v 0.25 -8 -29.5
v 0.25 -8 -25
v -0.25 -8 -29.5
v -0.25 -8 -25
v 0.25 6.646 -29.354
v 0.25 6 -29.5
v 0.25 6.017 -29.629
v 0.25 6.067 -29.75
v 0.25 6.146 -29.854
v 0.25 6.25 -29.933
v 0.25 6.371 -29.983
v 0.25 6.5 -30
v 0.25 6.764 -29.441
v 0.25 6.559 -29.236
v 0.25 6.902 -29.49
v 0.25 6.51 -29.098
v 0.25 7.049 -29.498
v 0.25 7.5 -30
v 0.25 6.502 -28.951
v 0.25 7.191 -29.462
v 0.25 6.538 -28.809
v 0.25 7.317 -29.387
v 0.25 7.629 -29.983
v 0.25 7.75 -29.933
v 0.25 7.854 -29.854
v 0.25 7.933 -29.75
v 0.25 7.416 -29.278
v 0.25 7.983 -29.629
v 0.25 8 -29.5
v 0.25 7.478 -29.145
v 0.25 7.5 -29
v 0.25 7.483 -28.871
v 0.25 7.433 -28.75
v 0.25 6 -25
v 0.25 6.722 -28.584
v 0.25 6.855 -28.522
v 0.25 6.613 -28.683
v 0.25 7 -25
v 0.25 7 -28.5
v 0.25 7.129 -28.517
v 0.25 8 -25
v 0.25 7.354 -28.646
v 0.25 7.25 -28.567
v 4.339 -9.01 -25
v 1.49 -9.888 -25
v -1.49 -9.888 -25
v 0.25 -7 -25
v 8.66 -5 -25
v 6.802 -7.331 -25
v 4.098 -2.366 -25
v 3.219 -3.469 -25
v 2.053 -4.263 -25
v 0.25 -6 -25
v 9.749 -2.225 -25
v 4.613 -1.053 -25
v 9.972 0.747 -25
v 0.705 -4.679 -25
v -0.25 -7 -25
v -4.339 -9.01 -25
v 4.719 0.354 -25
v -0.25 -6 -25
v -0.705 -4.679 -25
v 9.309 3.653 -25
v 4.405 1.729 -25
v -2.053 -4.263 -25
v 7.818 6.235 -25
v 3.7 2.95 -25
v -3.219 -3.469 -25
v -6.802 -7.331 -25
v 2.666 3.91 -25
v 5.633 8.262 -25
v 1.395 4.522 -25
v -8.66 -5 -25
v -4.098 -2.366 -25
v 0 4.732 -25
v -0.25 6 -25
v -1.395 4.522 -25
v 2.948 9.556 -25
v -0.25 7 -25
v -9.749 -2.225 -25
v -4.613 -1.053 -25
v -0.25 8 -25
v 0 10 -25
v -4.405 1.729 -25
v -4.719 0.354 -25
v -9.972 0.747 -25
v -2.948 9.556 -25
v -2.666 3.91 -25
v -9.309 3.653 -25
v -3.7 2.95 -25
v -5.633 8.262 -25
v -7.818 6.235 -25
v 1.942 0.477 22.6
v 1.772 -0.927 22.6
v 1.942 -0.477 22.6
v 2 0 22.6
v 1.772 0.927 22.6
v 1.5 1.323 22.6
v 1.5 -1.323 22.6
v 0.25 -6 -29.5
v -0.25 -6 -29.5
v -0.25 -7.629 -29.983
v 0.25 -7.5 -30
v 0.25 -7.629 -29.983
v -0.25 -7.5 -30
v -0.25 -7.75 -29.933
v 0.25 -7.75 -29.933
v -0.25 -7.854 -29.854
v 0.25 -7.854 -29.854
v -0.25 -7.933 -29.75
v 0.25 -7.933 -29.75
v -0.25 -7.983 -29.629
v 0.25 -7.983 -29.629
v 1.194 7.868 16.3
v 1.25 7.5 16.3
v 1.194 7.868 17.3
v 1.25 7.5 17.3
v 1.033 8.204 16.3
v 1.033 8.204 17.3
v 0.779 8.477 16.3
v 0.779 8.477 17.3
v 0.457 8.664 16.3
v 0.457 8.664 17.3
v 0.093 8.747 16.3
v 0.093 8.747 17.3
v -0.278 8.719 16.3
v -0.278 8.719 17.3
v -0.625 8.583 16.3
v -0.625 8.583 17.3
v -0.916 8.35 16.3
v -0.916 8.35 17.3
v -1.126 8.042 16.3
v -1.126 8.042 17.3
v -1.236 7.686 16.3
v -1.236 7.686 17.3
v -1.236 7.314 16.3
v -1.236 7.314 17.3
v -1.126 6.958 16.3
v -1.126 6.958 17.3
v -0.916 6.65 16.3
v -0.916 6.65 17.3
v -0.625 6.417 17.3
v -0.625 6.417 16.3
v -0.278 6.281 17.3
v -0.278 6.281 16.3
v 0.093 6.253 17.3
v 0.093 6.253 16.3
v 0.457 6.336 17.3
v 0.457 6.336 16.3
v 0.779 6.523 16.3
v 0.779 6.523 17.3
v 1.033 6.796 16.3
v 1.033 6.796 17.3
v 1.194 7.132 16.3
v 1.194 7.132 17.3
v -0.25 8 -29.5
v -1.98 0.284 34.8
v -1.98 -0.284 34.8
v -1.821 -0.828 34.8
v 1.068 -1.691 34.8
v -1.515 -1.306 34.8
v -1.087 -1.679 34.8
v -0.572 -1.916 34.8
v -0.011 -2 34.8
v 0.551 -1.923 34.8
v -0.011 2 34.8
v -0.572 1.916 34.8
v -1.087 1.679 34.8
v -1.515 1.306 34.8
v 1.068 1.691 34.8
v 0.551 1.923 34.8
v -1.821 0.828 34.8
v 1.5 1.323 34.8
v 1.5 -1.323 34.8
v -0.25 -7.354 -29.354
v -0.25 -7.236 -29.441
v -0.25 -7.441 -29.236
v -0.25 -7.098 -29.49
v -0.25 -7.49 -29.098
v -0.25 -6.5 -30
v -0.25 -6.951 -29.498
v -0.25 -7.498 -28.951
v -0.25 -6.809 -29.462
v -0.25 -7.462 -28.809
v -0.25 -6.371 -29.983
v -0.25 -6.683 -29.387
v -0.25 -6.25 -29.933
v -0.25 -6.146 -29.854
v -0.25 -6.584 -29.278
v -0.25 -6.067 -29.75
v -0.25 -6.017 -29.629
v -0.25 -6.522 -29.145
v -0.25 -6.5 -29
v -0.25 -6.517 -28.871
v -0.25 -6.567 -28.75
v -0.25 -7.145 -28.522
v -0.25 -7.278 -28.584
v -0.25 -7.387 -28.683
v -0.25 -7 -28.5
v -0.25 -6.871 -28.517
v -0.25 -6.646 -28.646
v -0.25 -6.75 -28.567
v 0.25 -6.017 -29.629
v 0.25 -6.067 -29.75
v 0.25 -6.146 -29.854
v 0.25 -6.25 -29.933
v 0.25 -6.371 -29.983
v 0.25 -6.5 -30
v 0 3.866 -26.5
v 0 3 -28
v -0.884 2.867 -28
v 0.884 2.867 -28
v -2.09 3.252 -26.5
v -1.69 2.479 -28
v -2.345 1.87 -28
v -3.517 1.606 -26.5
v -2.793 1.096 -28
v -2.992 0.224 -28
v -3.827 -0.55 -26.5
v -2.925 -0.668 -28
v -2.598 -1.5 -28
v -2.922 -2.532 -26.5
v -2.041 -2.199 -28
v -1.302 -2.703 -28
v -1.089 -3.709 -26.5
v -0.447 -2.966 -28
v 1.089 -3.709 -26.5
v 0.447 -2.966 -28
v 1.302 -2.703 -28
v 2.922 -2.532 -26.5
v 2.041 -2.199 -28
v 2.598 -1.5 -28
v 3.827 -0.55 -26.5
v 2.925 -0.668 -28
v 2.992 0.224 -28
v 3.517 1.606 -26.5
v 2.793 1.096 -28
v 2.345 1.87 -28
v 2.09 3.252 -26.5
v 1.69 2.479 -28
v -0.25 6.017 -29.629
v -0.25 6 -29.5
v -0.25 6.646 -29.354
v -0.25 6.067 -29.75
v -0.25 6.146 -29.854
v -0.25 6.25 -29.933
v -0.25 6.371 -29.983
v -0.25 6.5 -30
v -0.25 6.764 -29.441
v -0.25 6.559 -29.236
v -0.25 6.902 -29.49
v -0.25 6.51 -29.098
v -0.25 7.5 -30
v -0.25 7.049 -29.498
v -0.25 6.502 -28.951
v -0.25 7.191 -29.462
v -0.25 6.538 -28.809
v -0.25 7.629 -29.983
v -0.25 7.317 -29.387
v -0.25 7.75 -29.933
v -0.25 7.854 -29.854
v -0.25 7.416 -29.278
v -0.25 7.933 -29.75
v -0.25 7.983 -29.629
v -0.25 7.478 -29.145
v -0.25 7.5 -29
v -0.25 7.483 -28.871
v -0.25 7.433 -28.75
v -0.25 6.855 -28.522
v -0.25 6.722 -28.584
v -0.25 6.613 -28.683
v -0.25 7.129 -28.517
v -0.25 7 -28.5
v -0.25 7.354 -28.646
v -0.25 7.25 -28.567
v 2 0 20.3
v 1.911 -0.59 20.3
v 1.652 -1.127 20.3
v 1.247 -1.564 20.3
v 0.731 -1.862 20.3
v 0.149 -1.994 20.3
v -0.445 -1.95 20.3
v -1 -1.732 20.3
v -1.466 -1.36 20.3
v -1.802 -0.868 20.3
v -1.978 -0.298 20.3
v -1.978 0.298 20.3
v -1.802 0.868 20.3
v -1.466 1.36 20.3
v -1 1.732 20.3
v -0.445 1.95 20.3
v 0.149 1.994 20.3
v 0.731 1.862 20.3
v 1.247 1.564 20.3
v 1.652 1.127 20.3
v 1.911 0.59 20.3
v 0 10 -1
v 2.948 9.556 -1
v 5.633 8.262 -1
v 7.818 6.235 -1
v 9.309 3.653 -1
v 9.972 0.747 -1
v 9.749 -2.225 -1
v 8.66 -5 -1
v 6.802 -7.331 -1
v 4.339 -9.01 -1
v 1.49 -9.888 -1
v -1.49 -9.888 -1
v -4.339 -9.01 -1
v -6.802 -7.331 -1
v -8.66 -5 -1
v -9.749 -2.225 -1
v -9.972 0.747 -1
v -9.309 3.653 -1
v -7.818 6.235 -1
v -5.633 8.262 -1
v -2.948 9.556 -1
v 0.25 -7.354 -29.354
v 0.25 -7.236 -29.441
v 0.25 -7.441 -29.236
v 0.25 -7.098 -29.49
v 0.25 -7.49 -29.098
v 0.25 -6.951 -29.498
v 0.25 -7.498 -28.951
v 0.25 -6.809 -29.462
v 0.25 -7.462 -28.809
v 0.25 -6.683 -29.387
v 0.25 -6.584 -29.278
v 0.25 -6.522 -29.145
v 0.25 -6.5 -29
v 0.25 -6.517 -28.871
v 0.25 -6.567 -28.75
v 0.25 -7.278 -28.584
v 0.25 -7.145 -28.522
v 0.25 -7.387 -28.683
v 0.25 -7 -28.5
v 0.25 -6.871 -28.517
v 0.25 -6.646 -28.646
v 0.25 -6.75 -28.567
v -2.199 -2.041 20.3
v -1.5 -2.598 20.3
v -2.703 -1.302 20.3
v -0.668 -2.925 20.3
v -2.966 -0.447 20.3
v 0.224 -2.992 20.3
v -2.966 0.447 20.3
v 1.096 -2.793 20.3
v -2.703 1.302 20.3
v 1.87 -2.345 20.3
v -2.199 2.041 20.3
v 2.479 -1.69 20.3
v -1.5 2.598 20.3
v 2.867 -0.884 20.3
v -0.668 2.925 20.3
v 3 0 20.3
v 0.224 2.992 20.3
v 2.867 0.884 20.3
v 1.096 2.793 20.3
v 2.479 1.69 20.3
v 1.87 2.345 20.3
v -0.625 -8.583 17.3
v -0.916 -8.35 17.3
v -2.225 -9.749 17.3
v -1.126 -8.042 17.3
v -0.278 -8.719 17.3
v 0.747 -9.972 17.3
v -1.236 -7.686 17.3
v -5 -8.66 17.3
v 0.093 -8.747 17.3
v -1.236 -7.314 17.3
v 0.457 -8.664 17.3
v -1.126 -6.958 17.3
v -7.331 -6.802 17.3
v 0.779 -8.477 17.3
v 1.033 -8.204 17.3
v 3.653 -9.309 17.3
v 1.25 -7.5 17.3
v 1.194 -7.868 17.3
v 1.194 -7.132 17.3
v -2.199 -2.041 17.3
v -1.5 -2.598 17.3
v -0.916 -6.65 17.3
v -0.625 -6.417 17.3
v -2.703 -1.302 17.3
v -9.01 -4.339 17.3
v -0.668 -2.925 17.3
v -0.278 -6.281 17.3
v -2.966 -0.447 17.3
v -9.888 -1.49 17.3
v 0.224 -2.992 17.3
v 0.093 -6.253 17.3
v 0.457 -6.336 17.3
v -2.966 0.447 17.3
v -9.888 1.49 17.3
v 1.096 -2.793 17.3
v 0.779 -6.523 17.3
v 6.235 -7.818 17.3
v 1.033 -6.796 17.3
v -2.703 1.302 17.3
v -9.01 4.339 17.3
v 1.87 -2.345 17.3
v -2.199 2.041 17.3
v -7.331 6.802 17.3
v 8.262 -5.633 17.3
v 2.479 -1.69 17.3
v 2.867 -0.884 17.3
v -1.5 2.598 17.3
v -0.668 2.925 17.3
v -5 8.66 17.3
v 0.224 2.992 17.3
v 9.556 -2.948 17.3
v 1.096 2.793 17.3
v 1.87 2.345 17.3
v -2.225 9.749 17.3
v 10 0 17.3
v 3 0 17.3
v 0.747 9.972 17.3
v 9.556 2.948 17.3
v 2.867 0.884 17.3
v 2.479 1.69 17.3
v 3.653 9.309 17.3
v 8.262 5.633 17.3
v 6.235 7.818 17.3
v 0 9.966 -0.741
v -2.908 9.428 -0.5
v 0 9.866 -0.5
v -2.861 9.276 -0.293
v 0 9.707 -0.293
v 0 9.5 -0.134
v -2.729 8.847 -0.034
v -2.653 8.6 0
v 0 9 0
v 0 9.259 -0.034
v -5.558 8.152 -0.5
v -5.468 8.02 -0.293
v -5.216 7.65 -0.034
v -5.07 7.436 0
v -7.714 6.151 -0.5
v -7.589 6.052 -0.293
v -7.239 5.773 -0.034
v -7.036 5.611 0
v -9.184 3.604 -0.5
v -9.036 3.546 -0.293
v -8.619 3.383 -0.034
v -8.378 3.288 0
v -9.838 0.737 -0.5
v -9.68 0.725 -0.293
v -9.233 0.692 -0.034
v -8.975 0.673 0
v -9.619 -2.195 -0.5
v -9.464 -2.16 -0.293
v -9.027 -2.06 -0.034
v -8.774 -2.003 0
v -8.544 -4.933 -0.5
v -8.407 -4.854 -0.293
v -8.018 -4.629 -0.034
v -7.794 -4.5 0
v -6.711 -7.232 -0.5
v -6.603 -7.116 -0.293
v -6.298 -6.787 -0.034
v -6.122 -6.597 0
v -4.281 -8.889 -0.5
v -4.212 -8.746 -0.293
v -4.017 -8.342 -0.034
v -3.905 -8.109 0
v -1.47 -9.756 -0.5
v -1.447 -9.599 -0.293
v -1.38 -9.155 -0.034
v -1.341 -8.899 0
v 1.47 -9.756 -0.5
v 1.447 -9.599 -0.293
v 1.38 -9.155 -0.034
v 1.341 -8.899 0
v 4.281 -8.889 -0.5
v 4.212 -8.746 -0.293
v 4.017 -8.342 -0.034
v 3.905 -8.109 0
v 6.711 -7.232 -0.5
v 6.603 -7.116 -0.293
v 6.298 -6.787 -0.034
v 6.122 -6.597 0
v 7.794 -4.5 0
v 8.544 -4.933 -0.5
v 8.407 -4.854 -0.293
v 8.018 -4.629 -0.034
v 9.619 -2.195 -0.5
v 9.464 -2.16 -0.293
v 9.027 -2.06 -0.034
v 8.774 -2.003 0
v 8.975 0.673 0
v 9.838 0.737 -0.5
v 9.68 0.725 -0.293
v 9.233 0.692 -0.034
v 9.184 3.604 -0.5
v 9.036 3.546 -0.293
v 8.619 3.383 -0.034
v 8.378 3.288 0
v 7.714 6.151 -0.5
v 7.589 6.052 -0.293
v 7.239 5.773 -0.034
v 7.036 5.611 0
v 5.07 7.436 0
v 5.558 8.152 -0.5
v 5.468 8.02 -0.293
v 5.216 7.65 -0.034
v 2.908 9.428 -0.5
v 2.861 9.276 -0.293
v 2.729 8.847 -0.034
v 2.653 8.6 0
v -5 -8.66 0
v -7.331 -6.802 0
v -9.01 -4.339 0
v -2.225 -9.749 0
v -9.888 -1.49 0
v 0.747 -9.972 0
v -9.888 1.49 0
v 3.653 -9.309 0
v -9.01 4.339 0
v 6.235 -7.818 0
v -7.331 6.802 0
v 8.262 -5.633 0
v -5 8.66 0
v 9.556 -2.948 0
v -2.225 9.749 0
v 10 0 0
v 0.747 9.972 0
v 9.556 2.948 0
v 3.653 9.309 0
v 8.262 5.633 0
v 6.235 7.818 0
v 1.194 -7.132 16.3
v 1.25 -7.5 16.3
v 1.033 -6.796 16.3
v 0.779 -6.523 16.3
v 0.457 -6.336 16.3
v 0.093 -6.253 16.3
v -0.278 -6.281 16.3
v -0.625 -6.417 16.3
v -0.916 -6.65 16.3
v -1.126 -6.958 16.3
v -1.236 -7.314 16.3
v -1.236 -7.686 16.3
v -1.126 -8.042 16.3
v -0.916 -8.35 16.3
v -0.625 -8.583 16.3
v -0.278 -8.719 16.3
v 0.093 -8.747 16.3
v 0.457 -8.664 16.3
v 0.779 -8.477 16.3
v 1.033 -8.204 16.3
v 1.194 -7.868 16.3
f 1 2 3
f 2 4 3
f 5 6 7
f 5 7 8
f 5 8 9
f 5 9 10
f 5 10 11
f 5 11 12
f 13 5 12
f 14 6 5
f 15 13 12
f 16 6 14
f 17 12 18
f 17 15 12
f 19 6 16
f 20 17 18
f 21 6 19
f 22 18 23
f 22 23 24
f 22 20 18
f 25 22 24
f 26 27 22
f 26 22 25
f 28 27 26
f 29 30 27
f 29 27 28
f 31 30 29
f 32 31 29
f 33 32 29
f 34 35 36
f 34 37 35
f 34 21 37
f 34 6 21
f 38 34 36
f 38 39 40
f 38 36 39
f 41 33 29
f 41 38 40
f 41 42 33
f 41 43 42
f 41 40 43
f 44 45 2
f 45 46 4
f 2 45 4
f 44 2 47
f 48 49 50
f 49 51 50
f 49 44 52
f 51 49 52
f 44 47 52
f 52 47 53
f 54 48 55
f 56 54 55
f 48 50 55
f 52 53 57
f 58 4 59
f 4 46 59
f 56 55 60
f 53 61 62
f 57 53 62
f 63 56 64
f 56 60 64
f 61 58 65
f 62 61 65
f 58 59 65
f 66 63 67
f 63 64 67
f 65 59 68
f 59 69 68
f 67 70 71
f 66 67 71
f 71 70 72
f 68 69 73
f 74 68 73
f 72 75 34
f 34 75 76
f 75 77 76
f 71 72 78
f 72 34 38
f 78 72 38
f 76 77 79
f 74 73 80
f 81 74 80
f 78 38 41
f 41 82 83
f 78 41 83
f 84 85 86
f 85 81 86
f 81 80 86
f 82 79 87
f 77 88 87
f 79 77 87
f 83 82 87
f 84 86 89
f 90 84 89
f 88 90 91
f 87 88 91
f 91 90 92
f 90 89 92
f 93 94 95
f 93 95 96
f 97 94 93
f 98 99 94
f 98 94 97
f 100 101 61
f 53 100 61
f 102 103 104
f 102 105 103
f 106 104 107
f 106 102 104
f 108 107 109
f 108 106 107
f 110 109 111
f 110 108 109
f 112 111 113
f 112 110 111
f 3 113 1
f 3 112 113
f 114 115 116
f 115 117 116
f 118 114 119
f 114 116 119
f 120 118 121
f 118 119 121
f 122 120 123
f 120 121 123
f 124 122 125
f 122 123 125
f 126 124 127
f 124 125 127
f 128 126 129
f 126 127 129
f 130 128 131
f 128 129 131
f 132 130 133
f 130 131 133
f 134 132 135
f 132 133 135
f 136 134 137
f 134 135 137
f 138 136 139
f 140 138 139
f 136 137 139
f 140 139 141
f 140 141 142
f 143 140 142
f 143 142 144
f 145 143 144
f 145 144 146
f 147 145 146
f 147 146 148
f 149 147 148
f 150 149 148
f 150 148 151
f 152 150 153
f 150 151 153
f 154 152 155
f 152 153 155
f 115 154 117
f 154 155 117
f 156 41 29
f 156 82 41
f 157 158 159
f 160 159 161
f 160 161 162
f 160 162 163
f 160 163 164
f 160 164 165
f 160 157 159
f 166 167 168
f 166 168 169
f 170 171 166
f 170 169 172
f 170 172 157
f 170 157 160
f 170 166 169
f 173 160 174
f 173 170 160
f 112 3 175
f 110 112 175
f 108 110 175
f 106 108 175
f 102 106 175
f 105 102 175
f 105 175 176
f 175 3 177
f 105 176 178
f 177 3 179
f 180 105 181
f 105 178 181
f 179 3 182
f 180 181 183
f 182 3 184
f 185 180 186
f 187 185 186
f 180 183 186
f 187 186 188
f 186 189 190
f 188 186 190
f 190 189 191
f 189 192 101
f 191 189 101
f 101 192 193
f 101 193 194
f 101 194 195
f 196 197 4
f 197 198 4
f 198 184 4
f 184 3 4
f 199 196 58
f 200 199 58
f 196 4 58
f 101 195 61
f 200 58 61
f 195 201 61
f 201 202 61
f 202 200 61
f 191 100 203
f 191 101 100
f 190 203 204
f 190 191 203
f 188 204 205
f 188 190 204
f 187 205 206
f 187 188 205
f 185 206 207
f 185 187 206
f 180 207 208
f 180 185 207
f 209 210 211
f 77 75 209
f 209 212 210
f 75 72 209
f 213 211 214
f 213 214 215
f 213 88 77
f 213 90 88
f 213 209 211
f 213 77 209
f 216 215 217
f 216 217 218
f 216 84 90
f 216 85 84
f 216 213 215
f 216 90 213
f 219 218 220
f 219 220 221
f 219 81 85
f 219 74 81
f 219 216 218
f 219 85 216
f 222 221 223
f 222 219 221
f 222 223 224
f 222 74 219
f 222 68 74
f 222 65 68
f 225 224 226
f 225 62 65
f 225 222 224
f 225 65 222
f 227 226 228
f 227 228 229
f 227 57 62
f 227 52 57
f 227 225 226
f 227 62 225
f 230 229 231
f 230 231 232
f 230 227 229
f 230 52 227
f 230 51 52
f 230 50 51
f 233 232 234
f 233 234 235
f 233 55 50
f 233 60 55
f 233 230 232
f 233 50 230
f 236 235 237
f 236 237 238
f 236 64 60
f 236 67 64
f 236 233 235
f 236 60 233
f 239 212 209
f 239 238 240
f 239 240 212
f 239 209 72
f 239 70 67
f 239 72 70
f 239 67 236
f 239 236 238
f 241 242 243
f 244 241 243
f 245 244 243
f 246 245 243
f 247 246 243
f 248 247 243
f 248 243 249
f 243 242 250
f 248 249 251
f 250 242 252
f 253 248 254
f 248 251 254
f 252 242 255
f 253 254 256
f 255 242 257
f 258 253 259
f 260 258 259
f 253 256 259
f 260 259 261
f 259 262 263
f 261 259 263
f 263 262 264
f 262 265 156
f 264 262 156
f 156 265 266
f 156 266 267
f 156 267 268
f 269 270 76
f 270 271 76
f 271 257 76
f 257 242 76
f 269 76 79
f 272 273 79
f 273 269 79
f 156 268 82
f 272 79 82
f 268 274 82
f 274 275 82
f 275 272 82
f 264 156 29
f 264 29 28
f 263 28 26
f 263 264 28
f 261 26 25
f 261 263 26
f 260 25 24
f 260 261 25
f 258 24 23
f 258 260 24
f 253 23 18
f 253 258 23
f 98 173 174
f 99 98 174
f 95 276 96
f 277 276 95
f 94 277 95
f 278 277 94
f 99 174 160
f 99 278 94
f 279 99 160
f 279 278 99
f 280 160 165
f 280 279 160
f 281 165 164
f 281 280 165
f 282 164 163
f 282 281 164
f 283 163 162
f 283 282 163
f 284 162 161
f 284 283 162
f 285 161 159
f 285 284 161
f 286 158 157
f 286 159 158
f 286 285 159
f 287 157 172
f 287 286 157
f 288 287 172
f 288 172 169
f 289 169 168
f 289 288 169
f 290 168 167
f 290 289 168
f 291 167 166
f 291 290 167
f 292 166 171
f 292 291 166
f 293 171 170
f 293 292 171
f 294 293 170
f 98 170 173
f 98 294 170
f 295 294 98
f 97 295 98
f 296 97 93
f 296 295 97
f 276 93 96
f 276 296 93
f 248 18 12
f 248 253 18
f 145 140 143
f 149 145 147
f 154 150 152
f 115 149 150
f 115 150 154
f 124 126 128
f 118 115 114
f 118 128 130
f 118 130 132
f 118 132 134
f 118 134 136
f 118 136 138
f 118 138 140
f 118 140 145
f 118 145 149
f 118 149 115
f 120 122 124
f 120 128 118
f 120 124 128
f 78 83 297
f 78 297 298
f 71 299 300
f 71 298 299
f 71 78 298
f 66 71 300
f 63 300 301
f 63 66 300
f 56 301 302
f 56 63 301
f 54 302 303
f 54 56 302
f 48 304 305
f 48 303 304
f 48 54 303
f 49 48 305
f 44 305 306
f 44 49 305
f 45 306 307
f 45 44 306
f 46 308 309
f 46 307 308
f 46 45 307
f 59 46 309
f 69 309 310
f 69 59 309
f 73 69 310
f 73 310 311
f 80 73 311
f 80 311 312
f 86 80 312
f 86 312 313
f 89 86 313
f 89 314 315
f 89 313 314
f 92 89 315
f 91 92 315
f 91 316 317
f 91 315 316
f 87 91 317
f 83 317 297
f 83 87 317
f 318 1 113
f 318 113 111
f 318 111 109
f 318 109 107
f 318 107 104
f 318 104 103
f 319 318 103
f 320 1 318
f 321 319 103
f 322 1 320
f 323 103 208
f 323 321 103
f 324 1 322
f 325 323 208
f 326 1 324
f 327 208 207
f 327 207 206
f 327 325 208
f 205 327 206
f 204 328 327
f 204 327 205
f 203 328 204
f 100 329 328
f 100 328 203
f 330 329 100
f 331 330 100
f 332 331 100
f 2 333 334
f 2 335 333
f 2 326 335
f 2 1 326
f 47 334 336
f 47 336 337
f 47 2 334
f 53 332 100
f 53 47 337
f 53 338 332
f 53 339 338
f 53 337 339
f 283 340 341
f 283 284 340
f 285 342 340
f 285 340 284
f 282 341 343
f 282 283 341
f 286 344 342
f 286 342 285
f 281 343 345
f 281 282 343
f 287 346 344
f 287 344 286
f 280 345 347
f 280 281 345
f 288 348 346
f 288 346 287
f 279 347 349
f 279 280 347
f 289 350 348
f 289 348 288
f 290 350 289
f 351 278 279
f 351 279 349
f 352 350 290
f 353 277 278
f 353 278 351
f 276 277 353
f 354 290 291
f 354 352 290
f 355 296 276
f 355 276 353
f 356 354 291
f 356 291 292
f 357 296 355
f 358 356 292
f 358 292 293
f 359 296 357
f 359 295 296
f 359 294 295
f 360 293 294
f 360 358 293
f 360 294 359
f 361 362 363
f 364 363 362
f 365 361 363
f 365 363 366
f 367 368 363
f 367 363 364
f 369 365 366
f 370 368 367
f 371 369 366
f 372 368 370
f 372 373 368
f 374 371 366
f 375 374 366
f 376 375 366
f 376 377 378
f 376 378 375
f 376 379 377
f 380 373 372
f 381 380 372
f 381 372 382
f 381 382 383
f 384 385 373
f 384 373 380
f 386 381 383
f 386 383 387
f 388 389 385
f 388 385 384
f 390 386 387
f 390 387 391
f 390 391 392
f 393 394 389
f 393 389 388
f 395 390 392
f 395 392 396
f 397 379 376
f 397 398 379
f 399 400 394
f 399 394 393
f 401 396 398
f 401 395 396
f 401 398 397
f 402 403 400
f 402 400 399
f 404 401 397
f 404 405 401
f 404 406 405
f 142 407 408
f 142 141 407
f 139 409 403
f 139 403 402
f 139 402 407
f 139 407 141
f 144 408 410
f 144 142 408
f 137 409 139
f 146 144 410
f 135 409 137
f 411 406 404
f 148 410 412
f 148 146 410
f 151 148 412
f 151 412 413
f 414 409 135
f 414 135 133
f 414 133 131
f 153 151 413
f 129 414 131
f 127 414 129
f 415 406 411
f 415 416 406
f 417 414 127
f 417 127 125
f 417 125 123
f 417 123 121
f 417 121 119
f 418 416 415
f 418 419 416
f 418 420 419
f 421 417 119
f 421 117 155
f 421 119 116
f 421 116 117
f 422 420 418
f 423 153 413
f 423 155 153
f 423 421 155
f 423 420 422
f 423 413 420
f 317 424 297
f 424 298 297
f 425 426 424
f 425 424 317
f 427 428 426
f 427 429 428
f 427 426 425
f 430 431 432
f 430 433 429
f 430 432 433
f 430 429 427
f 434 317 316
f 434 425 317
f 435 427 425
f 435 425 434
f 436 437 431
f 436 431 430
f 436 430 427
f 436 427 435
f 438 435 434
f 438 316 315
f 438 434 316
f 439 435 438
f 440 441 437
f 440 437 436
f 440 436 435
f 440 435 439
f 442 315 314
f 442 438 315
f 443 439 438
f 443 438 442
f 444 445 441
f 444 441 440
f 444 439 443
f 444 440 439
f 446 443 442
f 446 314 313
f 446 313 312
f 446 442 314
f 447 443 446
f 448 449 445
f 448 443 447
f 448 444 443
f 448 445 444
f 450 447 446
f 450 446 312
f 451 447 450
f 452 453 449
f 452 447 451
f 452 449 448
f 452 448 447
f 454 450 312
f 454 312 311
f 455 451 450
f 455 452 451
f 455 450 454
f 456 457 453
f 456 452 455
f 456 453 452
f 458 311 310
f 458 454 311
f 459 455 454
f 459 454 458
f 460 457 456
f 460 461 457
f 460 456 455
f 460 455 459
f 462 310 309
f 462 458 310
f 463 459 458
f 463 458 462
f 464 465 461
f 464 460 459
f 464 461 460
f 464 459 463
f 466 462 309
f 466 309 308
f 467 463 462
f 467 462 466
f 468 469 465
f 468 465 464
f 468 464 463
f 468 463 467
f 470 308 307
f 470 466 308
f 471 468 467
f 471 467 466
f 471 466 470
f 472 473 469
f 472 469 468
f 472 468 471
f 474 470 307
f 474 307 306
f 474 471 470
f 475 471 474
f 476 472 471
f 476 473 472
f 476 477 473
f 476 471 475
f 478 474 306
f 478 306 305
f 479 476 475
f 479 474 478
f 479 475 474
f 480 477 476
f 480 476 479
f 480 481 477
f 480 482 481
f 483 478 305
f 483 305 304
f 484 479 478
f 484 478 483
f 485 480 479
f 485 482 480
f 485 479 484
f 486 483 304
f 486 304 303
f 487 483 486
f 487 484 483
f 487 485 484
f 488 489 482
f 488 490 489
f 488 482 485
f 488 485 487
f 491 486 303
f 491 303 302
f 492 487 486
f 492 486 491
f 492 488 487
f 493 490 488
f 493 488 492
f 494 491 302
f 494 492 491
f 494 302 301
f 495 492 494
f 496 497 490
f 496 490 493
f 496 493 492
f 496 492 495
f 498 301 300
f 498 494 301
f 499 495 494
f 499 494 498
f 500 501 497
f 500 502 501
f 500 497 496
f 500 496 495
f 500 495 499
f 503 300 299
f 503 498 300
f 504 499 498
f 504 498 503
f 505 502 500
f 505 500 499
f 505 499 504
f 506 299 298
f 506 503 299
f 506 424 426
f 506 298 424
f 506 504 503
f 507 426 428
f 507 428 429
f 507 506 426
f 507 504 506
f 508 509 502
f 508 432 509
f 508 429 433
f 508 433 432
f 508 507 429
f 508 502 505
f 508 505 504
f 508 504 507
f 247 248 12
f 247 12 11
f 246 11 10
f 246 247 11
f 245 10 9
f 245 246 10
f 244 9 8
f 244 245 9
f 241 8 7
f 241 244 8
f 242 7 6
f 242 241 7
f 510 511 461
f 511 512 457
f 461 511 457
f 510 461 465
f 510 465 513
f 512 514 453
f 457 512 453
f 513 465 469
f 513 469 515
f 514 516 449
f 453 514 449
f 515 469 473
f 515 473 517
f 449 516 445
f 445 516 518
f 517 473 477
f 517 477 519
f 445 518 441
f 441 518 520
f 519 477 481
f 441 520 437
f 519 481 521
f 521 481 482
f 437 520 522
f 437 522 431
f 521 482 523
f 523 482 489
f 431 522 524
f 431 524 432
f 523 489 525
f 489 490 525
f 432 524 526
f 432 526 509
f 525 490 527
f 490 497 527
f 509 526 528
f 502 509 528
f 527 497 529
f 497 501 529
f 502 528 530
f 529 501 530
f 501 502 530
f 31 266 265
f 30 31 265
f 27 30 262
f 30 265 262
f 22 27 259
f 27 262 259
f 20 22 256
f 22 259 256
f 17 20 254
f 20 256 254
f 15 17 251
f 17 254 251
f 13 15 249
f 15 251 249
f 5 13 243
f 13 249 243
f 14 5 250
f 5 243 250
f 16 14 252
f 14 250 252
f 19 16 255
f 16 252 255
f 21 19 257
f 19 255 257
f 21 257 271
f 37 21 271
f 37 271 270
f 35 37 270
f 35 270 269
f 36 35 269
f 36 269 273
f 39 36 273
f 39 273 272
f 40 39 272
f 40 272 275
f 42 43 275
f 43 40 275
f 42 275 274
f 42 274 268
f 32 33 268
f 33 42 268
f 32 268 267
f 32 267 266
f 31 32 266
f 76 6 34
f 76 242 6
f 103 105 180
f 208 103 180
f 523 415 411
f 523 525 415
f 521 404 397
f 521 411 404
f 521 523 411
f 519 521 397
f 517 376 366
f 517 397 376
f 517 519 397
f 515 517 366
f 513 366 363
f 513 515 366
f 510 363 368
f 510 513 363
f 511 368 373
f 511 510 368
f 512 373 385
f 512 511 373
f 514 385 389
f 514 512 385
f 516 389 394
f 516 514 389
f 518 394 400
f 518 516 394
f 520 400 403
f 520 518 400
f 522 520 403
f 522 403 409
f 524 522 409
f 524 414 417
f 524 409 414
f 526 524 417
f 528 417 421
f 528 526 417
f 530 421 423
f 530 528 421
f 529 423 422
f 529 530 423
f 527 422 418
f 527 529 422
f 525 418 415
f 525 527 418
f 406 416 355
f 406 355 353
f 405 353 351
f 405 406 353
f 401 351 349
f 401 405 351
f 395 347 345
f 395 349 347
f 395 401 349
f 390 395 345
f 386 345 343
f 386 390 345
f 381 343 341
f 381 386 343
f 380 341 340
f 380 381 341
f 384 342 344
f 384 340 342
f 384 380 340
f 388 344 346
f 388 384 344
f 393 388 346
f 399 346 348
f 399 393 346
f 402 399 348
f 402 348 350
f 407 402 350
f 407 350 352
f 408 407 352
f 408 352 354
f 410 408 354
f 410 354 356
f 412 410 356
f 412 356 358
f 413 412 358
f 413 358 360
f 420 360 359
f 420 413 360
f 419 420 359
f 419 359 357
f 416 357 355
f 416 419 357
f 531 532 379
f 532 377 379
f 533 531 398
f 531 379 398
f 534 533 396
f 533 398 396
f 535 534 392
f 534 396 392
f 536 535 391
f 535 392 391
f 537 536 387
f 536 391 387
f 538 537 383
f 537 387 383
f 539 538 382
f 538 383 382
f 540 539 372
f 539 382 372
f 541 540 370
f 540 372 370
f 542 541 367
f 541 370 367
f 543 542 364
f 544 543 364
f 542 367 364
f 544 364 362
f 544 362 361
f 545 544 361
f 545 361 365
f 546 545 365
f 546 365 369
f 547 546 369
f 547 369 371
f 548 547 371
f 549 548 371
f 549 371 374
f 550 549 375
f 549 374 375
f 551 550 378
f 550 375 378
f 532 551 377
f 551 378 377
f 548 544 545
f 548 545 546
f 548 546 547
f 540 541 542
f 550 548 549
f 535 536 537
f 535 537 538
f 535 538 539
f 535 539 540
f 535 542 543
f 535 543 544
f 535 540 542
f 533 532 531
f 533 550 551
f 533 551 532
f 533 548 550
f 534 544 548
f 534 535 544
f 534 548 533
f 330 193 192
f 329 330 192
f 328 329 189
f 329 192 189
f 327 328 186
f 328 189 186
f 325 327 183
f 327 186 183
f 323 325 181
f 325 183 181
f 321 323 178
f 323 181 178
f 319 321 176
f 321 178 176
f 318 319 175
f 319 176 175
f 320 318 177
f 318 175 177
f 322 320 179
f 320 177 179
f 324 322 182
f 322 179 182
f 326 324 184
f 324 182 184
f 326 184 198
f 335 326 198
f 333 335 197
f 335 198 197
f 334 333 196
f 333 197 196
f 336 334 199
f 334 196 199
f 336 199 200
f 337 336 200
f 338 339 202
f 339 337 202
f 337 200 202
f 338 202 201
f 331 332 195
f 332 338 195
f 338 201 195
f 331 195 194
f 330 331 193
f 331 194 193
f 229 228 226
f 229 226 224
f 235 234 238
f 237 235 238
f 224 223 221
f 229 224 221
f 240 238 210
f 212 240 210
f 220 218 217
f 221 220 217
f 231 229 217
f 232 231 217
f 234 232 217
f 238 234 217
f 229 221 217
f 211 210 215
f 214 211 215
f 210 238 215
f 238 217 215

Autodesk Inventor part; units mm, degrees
ref_plane "YZ Plane" through (0, 0, 0) normal (1, 0, 0) x (0, 1, 0)
ref_plane "XZ Plane" through (0, 0, 0) normal (0, 1, 0) x (-1, 0, 0)
ref_plane "XY Plane" through (0, 0, 0) normal (0, 0, 1) x (1, 0, 0)
sketch "Sketch1" plane through (0, 0, 0) normal (0, 0, 1) x (1, 0, 0)
  circle A0 centre (0, 0) radius 10
  dimension "d0" = 20
extrude "Extrusion1" add sketch "Sketch1" along normal blind 17.3
sketch "Sketch2" plane through (0, 0, 17.3) normal (0, 0, 1) x (1, 0, 0)
  line L0 (0, 0) -> (0, 7.5)
  circle A0 centre (0, 7.5) radius 1.25
  line L1 (0, 0) -> (0, -7.5)
  circle A1 centre (0, -7.5) radius 1.25
  dimension "d3" = 7.5
  dimension "d4" = 2.5
  dimension "d5" = 7.5
  dimension "d6" = 2.5
extrude "Extrusion2" cut sketch "Sketch2" against normal blind 1
sketch "Sketch3" plane through (0, 0, 17.3) normal (0, 0, 1) x (1, 0, 0)
  circle A0 centre (0, 0) radius 3
  dimension "d9" = 6
extrude "Extrusion3" add sketch "Sketch3" along normal blind 3
sketch "Sketch4" plane through (0, 0, 20.3) normal (0, 0, 1) x (1, 0, 0)
  circle A0 centre (0, 0) radius 2
  dimension "d12" = 4
extrude "Extrusion4" add sketch "Sketch4" along normal blind 14.5
sketch "Sketch5" plane through (0, 0, 34.8) normal (0, 0, 1) x (1, 0, 0)
  line L0 (0, 0) -> (2, 0)
  line L1 (2, 0) -> (1.5, 0)
  circle A0 centre (0, 0) radius 2
  line L2 (1.5, 0) -> (1.5, 1.3229)
  line L3 (1.5, 0) -> (1.5, -1.3229)
  circle A1 centre (0, 0) radius 2 projected
  dimension "d17" = 4
  dimension "d15" = 2
  dimension "d16" = 0.5
extrude "Extrusion5" cut sketch "Sketch5" against normal blind 12.2 contours L2 A0 L0 | L0 A0 L3
sketch "Sketch7" plane through (0, 0, 0) normal (1, 0, 0) x (0, 1, 0)
  line L0 (10, 0) -> (-10, 0) projected
  line L1 (0, 0) -> (9, 0)
  line L2 (10, -1) -> (10, -25)
  line L3 (10, -25) -> (0, -25)
  line L4 (0, -25) -> (0, 0)
  arc A0 (10, -1) -> (9, 0) centre (9, -1) ccw
  line L5 (0, -25) -> (0, -28)
  line L6 (0, -28) -> (3, -28)
  line L7 (3, -28) -> (4.7321, -25)
  dimension "d20" = 10
  dimension "d21" = 25
  dimension "d22" = 1
  dimension "d23" = 3
  dimension "d24" = 3
  dimension "d25" = 120
revolve "Revolution1" add sketch "Sketch7" angle 360 about axis through (0, 0, -25) along (0, 0, 1)
sketch "Sketch8" plane through (0, 0, 0) normal (1, 0, 0) x (0, 1, 0)
  line L0 (-4.7321, -25) -> (4.7321, -25) projected
  line L1 (0, -25) -> (8, -25)
  line L2 (8, -25) -> (8, -29.5)
  line L3 (7.5, -30) -> (6.5, -30)
  line L4 (6, -29.5) -> (6, -25)
  arc A0 (7.5, -30) -> (8, -29.5) centre (7.5, -29.5) ccw
  arc A1 (6, -29.5) -> (6.5, -30) centre (6.5, -29.5) ccw
  line L5 (-10, -25) -> (10, -25) projected
  line L6 (7, -25) -> (7, -29)
  circle A2 centre (7, -29) radius 0.5
  line L7 (0, -25) -> (0, -32)
  line L8 (0, -25) -> (-8, -25)
  line L9 (-8, -25) -> (-8, -29.5)
  line L10 (-7.5, -30) -> (-6.5, -30)
  line L11 (-6, -29.5) -> (-6, -25)
  arc A3 (-8, -29.5) -> (-7.5, -30) centre (-7.5, -29.5) ccw
  arc A4 (-6.5, -30) -> (-6, -29.5) centre (-6.5, -29.5) ccw
  line L12 (-7, -25) -> (-7, -29)
  circle A5 centre (-7, -29) radius 0.5
  point P0 (0, 0)
  point P1 (8, -30)
  point P2 (6, -30)
  point P3 (-8, -30)
  point P4 (-6, -30)
  point P5 (-8, -25)
  point P6 (-6, -25)
  dimension "d27" = 8
  dimension "d28" = 5
  dimension "d29" = 2
  dimension "d30" = 0.5
  dimension "d31" = 4
  dimension "d32" = 1
  dimension "d33" = 7
extrude "Extrusion6" add sketch "Sketch8" along normal mid plane 0.5
properties part number "motor_dc_20d_12v"
